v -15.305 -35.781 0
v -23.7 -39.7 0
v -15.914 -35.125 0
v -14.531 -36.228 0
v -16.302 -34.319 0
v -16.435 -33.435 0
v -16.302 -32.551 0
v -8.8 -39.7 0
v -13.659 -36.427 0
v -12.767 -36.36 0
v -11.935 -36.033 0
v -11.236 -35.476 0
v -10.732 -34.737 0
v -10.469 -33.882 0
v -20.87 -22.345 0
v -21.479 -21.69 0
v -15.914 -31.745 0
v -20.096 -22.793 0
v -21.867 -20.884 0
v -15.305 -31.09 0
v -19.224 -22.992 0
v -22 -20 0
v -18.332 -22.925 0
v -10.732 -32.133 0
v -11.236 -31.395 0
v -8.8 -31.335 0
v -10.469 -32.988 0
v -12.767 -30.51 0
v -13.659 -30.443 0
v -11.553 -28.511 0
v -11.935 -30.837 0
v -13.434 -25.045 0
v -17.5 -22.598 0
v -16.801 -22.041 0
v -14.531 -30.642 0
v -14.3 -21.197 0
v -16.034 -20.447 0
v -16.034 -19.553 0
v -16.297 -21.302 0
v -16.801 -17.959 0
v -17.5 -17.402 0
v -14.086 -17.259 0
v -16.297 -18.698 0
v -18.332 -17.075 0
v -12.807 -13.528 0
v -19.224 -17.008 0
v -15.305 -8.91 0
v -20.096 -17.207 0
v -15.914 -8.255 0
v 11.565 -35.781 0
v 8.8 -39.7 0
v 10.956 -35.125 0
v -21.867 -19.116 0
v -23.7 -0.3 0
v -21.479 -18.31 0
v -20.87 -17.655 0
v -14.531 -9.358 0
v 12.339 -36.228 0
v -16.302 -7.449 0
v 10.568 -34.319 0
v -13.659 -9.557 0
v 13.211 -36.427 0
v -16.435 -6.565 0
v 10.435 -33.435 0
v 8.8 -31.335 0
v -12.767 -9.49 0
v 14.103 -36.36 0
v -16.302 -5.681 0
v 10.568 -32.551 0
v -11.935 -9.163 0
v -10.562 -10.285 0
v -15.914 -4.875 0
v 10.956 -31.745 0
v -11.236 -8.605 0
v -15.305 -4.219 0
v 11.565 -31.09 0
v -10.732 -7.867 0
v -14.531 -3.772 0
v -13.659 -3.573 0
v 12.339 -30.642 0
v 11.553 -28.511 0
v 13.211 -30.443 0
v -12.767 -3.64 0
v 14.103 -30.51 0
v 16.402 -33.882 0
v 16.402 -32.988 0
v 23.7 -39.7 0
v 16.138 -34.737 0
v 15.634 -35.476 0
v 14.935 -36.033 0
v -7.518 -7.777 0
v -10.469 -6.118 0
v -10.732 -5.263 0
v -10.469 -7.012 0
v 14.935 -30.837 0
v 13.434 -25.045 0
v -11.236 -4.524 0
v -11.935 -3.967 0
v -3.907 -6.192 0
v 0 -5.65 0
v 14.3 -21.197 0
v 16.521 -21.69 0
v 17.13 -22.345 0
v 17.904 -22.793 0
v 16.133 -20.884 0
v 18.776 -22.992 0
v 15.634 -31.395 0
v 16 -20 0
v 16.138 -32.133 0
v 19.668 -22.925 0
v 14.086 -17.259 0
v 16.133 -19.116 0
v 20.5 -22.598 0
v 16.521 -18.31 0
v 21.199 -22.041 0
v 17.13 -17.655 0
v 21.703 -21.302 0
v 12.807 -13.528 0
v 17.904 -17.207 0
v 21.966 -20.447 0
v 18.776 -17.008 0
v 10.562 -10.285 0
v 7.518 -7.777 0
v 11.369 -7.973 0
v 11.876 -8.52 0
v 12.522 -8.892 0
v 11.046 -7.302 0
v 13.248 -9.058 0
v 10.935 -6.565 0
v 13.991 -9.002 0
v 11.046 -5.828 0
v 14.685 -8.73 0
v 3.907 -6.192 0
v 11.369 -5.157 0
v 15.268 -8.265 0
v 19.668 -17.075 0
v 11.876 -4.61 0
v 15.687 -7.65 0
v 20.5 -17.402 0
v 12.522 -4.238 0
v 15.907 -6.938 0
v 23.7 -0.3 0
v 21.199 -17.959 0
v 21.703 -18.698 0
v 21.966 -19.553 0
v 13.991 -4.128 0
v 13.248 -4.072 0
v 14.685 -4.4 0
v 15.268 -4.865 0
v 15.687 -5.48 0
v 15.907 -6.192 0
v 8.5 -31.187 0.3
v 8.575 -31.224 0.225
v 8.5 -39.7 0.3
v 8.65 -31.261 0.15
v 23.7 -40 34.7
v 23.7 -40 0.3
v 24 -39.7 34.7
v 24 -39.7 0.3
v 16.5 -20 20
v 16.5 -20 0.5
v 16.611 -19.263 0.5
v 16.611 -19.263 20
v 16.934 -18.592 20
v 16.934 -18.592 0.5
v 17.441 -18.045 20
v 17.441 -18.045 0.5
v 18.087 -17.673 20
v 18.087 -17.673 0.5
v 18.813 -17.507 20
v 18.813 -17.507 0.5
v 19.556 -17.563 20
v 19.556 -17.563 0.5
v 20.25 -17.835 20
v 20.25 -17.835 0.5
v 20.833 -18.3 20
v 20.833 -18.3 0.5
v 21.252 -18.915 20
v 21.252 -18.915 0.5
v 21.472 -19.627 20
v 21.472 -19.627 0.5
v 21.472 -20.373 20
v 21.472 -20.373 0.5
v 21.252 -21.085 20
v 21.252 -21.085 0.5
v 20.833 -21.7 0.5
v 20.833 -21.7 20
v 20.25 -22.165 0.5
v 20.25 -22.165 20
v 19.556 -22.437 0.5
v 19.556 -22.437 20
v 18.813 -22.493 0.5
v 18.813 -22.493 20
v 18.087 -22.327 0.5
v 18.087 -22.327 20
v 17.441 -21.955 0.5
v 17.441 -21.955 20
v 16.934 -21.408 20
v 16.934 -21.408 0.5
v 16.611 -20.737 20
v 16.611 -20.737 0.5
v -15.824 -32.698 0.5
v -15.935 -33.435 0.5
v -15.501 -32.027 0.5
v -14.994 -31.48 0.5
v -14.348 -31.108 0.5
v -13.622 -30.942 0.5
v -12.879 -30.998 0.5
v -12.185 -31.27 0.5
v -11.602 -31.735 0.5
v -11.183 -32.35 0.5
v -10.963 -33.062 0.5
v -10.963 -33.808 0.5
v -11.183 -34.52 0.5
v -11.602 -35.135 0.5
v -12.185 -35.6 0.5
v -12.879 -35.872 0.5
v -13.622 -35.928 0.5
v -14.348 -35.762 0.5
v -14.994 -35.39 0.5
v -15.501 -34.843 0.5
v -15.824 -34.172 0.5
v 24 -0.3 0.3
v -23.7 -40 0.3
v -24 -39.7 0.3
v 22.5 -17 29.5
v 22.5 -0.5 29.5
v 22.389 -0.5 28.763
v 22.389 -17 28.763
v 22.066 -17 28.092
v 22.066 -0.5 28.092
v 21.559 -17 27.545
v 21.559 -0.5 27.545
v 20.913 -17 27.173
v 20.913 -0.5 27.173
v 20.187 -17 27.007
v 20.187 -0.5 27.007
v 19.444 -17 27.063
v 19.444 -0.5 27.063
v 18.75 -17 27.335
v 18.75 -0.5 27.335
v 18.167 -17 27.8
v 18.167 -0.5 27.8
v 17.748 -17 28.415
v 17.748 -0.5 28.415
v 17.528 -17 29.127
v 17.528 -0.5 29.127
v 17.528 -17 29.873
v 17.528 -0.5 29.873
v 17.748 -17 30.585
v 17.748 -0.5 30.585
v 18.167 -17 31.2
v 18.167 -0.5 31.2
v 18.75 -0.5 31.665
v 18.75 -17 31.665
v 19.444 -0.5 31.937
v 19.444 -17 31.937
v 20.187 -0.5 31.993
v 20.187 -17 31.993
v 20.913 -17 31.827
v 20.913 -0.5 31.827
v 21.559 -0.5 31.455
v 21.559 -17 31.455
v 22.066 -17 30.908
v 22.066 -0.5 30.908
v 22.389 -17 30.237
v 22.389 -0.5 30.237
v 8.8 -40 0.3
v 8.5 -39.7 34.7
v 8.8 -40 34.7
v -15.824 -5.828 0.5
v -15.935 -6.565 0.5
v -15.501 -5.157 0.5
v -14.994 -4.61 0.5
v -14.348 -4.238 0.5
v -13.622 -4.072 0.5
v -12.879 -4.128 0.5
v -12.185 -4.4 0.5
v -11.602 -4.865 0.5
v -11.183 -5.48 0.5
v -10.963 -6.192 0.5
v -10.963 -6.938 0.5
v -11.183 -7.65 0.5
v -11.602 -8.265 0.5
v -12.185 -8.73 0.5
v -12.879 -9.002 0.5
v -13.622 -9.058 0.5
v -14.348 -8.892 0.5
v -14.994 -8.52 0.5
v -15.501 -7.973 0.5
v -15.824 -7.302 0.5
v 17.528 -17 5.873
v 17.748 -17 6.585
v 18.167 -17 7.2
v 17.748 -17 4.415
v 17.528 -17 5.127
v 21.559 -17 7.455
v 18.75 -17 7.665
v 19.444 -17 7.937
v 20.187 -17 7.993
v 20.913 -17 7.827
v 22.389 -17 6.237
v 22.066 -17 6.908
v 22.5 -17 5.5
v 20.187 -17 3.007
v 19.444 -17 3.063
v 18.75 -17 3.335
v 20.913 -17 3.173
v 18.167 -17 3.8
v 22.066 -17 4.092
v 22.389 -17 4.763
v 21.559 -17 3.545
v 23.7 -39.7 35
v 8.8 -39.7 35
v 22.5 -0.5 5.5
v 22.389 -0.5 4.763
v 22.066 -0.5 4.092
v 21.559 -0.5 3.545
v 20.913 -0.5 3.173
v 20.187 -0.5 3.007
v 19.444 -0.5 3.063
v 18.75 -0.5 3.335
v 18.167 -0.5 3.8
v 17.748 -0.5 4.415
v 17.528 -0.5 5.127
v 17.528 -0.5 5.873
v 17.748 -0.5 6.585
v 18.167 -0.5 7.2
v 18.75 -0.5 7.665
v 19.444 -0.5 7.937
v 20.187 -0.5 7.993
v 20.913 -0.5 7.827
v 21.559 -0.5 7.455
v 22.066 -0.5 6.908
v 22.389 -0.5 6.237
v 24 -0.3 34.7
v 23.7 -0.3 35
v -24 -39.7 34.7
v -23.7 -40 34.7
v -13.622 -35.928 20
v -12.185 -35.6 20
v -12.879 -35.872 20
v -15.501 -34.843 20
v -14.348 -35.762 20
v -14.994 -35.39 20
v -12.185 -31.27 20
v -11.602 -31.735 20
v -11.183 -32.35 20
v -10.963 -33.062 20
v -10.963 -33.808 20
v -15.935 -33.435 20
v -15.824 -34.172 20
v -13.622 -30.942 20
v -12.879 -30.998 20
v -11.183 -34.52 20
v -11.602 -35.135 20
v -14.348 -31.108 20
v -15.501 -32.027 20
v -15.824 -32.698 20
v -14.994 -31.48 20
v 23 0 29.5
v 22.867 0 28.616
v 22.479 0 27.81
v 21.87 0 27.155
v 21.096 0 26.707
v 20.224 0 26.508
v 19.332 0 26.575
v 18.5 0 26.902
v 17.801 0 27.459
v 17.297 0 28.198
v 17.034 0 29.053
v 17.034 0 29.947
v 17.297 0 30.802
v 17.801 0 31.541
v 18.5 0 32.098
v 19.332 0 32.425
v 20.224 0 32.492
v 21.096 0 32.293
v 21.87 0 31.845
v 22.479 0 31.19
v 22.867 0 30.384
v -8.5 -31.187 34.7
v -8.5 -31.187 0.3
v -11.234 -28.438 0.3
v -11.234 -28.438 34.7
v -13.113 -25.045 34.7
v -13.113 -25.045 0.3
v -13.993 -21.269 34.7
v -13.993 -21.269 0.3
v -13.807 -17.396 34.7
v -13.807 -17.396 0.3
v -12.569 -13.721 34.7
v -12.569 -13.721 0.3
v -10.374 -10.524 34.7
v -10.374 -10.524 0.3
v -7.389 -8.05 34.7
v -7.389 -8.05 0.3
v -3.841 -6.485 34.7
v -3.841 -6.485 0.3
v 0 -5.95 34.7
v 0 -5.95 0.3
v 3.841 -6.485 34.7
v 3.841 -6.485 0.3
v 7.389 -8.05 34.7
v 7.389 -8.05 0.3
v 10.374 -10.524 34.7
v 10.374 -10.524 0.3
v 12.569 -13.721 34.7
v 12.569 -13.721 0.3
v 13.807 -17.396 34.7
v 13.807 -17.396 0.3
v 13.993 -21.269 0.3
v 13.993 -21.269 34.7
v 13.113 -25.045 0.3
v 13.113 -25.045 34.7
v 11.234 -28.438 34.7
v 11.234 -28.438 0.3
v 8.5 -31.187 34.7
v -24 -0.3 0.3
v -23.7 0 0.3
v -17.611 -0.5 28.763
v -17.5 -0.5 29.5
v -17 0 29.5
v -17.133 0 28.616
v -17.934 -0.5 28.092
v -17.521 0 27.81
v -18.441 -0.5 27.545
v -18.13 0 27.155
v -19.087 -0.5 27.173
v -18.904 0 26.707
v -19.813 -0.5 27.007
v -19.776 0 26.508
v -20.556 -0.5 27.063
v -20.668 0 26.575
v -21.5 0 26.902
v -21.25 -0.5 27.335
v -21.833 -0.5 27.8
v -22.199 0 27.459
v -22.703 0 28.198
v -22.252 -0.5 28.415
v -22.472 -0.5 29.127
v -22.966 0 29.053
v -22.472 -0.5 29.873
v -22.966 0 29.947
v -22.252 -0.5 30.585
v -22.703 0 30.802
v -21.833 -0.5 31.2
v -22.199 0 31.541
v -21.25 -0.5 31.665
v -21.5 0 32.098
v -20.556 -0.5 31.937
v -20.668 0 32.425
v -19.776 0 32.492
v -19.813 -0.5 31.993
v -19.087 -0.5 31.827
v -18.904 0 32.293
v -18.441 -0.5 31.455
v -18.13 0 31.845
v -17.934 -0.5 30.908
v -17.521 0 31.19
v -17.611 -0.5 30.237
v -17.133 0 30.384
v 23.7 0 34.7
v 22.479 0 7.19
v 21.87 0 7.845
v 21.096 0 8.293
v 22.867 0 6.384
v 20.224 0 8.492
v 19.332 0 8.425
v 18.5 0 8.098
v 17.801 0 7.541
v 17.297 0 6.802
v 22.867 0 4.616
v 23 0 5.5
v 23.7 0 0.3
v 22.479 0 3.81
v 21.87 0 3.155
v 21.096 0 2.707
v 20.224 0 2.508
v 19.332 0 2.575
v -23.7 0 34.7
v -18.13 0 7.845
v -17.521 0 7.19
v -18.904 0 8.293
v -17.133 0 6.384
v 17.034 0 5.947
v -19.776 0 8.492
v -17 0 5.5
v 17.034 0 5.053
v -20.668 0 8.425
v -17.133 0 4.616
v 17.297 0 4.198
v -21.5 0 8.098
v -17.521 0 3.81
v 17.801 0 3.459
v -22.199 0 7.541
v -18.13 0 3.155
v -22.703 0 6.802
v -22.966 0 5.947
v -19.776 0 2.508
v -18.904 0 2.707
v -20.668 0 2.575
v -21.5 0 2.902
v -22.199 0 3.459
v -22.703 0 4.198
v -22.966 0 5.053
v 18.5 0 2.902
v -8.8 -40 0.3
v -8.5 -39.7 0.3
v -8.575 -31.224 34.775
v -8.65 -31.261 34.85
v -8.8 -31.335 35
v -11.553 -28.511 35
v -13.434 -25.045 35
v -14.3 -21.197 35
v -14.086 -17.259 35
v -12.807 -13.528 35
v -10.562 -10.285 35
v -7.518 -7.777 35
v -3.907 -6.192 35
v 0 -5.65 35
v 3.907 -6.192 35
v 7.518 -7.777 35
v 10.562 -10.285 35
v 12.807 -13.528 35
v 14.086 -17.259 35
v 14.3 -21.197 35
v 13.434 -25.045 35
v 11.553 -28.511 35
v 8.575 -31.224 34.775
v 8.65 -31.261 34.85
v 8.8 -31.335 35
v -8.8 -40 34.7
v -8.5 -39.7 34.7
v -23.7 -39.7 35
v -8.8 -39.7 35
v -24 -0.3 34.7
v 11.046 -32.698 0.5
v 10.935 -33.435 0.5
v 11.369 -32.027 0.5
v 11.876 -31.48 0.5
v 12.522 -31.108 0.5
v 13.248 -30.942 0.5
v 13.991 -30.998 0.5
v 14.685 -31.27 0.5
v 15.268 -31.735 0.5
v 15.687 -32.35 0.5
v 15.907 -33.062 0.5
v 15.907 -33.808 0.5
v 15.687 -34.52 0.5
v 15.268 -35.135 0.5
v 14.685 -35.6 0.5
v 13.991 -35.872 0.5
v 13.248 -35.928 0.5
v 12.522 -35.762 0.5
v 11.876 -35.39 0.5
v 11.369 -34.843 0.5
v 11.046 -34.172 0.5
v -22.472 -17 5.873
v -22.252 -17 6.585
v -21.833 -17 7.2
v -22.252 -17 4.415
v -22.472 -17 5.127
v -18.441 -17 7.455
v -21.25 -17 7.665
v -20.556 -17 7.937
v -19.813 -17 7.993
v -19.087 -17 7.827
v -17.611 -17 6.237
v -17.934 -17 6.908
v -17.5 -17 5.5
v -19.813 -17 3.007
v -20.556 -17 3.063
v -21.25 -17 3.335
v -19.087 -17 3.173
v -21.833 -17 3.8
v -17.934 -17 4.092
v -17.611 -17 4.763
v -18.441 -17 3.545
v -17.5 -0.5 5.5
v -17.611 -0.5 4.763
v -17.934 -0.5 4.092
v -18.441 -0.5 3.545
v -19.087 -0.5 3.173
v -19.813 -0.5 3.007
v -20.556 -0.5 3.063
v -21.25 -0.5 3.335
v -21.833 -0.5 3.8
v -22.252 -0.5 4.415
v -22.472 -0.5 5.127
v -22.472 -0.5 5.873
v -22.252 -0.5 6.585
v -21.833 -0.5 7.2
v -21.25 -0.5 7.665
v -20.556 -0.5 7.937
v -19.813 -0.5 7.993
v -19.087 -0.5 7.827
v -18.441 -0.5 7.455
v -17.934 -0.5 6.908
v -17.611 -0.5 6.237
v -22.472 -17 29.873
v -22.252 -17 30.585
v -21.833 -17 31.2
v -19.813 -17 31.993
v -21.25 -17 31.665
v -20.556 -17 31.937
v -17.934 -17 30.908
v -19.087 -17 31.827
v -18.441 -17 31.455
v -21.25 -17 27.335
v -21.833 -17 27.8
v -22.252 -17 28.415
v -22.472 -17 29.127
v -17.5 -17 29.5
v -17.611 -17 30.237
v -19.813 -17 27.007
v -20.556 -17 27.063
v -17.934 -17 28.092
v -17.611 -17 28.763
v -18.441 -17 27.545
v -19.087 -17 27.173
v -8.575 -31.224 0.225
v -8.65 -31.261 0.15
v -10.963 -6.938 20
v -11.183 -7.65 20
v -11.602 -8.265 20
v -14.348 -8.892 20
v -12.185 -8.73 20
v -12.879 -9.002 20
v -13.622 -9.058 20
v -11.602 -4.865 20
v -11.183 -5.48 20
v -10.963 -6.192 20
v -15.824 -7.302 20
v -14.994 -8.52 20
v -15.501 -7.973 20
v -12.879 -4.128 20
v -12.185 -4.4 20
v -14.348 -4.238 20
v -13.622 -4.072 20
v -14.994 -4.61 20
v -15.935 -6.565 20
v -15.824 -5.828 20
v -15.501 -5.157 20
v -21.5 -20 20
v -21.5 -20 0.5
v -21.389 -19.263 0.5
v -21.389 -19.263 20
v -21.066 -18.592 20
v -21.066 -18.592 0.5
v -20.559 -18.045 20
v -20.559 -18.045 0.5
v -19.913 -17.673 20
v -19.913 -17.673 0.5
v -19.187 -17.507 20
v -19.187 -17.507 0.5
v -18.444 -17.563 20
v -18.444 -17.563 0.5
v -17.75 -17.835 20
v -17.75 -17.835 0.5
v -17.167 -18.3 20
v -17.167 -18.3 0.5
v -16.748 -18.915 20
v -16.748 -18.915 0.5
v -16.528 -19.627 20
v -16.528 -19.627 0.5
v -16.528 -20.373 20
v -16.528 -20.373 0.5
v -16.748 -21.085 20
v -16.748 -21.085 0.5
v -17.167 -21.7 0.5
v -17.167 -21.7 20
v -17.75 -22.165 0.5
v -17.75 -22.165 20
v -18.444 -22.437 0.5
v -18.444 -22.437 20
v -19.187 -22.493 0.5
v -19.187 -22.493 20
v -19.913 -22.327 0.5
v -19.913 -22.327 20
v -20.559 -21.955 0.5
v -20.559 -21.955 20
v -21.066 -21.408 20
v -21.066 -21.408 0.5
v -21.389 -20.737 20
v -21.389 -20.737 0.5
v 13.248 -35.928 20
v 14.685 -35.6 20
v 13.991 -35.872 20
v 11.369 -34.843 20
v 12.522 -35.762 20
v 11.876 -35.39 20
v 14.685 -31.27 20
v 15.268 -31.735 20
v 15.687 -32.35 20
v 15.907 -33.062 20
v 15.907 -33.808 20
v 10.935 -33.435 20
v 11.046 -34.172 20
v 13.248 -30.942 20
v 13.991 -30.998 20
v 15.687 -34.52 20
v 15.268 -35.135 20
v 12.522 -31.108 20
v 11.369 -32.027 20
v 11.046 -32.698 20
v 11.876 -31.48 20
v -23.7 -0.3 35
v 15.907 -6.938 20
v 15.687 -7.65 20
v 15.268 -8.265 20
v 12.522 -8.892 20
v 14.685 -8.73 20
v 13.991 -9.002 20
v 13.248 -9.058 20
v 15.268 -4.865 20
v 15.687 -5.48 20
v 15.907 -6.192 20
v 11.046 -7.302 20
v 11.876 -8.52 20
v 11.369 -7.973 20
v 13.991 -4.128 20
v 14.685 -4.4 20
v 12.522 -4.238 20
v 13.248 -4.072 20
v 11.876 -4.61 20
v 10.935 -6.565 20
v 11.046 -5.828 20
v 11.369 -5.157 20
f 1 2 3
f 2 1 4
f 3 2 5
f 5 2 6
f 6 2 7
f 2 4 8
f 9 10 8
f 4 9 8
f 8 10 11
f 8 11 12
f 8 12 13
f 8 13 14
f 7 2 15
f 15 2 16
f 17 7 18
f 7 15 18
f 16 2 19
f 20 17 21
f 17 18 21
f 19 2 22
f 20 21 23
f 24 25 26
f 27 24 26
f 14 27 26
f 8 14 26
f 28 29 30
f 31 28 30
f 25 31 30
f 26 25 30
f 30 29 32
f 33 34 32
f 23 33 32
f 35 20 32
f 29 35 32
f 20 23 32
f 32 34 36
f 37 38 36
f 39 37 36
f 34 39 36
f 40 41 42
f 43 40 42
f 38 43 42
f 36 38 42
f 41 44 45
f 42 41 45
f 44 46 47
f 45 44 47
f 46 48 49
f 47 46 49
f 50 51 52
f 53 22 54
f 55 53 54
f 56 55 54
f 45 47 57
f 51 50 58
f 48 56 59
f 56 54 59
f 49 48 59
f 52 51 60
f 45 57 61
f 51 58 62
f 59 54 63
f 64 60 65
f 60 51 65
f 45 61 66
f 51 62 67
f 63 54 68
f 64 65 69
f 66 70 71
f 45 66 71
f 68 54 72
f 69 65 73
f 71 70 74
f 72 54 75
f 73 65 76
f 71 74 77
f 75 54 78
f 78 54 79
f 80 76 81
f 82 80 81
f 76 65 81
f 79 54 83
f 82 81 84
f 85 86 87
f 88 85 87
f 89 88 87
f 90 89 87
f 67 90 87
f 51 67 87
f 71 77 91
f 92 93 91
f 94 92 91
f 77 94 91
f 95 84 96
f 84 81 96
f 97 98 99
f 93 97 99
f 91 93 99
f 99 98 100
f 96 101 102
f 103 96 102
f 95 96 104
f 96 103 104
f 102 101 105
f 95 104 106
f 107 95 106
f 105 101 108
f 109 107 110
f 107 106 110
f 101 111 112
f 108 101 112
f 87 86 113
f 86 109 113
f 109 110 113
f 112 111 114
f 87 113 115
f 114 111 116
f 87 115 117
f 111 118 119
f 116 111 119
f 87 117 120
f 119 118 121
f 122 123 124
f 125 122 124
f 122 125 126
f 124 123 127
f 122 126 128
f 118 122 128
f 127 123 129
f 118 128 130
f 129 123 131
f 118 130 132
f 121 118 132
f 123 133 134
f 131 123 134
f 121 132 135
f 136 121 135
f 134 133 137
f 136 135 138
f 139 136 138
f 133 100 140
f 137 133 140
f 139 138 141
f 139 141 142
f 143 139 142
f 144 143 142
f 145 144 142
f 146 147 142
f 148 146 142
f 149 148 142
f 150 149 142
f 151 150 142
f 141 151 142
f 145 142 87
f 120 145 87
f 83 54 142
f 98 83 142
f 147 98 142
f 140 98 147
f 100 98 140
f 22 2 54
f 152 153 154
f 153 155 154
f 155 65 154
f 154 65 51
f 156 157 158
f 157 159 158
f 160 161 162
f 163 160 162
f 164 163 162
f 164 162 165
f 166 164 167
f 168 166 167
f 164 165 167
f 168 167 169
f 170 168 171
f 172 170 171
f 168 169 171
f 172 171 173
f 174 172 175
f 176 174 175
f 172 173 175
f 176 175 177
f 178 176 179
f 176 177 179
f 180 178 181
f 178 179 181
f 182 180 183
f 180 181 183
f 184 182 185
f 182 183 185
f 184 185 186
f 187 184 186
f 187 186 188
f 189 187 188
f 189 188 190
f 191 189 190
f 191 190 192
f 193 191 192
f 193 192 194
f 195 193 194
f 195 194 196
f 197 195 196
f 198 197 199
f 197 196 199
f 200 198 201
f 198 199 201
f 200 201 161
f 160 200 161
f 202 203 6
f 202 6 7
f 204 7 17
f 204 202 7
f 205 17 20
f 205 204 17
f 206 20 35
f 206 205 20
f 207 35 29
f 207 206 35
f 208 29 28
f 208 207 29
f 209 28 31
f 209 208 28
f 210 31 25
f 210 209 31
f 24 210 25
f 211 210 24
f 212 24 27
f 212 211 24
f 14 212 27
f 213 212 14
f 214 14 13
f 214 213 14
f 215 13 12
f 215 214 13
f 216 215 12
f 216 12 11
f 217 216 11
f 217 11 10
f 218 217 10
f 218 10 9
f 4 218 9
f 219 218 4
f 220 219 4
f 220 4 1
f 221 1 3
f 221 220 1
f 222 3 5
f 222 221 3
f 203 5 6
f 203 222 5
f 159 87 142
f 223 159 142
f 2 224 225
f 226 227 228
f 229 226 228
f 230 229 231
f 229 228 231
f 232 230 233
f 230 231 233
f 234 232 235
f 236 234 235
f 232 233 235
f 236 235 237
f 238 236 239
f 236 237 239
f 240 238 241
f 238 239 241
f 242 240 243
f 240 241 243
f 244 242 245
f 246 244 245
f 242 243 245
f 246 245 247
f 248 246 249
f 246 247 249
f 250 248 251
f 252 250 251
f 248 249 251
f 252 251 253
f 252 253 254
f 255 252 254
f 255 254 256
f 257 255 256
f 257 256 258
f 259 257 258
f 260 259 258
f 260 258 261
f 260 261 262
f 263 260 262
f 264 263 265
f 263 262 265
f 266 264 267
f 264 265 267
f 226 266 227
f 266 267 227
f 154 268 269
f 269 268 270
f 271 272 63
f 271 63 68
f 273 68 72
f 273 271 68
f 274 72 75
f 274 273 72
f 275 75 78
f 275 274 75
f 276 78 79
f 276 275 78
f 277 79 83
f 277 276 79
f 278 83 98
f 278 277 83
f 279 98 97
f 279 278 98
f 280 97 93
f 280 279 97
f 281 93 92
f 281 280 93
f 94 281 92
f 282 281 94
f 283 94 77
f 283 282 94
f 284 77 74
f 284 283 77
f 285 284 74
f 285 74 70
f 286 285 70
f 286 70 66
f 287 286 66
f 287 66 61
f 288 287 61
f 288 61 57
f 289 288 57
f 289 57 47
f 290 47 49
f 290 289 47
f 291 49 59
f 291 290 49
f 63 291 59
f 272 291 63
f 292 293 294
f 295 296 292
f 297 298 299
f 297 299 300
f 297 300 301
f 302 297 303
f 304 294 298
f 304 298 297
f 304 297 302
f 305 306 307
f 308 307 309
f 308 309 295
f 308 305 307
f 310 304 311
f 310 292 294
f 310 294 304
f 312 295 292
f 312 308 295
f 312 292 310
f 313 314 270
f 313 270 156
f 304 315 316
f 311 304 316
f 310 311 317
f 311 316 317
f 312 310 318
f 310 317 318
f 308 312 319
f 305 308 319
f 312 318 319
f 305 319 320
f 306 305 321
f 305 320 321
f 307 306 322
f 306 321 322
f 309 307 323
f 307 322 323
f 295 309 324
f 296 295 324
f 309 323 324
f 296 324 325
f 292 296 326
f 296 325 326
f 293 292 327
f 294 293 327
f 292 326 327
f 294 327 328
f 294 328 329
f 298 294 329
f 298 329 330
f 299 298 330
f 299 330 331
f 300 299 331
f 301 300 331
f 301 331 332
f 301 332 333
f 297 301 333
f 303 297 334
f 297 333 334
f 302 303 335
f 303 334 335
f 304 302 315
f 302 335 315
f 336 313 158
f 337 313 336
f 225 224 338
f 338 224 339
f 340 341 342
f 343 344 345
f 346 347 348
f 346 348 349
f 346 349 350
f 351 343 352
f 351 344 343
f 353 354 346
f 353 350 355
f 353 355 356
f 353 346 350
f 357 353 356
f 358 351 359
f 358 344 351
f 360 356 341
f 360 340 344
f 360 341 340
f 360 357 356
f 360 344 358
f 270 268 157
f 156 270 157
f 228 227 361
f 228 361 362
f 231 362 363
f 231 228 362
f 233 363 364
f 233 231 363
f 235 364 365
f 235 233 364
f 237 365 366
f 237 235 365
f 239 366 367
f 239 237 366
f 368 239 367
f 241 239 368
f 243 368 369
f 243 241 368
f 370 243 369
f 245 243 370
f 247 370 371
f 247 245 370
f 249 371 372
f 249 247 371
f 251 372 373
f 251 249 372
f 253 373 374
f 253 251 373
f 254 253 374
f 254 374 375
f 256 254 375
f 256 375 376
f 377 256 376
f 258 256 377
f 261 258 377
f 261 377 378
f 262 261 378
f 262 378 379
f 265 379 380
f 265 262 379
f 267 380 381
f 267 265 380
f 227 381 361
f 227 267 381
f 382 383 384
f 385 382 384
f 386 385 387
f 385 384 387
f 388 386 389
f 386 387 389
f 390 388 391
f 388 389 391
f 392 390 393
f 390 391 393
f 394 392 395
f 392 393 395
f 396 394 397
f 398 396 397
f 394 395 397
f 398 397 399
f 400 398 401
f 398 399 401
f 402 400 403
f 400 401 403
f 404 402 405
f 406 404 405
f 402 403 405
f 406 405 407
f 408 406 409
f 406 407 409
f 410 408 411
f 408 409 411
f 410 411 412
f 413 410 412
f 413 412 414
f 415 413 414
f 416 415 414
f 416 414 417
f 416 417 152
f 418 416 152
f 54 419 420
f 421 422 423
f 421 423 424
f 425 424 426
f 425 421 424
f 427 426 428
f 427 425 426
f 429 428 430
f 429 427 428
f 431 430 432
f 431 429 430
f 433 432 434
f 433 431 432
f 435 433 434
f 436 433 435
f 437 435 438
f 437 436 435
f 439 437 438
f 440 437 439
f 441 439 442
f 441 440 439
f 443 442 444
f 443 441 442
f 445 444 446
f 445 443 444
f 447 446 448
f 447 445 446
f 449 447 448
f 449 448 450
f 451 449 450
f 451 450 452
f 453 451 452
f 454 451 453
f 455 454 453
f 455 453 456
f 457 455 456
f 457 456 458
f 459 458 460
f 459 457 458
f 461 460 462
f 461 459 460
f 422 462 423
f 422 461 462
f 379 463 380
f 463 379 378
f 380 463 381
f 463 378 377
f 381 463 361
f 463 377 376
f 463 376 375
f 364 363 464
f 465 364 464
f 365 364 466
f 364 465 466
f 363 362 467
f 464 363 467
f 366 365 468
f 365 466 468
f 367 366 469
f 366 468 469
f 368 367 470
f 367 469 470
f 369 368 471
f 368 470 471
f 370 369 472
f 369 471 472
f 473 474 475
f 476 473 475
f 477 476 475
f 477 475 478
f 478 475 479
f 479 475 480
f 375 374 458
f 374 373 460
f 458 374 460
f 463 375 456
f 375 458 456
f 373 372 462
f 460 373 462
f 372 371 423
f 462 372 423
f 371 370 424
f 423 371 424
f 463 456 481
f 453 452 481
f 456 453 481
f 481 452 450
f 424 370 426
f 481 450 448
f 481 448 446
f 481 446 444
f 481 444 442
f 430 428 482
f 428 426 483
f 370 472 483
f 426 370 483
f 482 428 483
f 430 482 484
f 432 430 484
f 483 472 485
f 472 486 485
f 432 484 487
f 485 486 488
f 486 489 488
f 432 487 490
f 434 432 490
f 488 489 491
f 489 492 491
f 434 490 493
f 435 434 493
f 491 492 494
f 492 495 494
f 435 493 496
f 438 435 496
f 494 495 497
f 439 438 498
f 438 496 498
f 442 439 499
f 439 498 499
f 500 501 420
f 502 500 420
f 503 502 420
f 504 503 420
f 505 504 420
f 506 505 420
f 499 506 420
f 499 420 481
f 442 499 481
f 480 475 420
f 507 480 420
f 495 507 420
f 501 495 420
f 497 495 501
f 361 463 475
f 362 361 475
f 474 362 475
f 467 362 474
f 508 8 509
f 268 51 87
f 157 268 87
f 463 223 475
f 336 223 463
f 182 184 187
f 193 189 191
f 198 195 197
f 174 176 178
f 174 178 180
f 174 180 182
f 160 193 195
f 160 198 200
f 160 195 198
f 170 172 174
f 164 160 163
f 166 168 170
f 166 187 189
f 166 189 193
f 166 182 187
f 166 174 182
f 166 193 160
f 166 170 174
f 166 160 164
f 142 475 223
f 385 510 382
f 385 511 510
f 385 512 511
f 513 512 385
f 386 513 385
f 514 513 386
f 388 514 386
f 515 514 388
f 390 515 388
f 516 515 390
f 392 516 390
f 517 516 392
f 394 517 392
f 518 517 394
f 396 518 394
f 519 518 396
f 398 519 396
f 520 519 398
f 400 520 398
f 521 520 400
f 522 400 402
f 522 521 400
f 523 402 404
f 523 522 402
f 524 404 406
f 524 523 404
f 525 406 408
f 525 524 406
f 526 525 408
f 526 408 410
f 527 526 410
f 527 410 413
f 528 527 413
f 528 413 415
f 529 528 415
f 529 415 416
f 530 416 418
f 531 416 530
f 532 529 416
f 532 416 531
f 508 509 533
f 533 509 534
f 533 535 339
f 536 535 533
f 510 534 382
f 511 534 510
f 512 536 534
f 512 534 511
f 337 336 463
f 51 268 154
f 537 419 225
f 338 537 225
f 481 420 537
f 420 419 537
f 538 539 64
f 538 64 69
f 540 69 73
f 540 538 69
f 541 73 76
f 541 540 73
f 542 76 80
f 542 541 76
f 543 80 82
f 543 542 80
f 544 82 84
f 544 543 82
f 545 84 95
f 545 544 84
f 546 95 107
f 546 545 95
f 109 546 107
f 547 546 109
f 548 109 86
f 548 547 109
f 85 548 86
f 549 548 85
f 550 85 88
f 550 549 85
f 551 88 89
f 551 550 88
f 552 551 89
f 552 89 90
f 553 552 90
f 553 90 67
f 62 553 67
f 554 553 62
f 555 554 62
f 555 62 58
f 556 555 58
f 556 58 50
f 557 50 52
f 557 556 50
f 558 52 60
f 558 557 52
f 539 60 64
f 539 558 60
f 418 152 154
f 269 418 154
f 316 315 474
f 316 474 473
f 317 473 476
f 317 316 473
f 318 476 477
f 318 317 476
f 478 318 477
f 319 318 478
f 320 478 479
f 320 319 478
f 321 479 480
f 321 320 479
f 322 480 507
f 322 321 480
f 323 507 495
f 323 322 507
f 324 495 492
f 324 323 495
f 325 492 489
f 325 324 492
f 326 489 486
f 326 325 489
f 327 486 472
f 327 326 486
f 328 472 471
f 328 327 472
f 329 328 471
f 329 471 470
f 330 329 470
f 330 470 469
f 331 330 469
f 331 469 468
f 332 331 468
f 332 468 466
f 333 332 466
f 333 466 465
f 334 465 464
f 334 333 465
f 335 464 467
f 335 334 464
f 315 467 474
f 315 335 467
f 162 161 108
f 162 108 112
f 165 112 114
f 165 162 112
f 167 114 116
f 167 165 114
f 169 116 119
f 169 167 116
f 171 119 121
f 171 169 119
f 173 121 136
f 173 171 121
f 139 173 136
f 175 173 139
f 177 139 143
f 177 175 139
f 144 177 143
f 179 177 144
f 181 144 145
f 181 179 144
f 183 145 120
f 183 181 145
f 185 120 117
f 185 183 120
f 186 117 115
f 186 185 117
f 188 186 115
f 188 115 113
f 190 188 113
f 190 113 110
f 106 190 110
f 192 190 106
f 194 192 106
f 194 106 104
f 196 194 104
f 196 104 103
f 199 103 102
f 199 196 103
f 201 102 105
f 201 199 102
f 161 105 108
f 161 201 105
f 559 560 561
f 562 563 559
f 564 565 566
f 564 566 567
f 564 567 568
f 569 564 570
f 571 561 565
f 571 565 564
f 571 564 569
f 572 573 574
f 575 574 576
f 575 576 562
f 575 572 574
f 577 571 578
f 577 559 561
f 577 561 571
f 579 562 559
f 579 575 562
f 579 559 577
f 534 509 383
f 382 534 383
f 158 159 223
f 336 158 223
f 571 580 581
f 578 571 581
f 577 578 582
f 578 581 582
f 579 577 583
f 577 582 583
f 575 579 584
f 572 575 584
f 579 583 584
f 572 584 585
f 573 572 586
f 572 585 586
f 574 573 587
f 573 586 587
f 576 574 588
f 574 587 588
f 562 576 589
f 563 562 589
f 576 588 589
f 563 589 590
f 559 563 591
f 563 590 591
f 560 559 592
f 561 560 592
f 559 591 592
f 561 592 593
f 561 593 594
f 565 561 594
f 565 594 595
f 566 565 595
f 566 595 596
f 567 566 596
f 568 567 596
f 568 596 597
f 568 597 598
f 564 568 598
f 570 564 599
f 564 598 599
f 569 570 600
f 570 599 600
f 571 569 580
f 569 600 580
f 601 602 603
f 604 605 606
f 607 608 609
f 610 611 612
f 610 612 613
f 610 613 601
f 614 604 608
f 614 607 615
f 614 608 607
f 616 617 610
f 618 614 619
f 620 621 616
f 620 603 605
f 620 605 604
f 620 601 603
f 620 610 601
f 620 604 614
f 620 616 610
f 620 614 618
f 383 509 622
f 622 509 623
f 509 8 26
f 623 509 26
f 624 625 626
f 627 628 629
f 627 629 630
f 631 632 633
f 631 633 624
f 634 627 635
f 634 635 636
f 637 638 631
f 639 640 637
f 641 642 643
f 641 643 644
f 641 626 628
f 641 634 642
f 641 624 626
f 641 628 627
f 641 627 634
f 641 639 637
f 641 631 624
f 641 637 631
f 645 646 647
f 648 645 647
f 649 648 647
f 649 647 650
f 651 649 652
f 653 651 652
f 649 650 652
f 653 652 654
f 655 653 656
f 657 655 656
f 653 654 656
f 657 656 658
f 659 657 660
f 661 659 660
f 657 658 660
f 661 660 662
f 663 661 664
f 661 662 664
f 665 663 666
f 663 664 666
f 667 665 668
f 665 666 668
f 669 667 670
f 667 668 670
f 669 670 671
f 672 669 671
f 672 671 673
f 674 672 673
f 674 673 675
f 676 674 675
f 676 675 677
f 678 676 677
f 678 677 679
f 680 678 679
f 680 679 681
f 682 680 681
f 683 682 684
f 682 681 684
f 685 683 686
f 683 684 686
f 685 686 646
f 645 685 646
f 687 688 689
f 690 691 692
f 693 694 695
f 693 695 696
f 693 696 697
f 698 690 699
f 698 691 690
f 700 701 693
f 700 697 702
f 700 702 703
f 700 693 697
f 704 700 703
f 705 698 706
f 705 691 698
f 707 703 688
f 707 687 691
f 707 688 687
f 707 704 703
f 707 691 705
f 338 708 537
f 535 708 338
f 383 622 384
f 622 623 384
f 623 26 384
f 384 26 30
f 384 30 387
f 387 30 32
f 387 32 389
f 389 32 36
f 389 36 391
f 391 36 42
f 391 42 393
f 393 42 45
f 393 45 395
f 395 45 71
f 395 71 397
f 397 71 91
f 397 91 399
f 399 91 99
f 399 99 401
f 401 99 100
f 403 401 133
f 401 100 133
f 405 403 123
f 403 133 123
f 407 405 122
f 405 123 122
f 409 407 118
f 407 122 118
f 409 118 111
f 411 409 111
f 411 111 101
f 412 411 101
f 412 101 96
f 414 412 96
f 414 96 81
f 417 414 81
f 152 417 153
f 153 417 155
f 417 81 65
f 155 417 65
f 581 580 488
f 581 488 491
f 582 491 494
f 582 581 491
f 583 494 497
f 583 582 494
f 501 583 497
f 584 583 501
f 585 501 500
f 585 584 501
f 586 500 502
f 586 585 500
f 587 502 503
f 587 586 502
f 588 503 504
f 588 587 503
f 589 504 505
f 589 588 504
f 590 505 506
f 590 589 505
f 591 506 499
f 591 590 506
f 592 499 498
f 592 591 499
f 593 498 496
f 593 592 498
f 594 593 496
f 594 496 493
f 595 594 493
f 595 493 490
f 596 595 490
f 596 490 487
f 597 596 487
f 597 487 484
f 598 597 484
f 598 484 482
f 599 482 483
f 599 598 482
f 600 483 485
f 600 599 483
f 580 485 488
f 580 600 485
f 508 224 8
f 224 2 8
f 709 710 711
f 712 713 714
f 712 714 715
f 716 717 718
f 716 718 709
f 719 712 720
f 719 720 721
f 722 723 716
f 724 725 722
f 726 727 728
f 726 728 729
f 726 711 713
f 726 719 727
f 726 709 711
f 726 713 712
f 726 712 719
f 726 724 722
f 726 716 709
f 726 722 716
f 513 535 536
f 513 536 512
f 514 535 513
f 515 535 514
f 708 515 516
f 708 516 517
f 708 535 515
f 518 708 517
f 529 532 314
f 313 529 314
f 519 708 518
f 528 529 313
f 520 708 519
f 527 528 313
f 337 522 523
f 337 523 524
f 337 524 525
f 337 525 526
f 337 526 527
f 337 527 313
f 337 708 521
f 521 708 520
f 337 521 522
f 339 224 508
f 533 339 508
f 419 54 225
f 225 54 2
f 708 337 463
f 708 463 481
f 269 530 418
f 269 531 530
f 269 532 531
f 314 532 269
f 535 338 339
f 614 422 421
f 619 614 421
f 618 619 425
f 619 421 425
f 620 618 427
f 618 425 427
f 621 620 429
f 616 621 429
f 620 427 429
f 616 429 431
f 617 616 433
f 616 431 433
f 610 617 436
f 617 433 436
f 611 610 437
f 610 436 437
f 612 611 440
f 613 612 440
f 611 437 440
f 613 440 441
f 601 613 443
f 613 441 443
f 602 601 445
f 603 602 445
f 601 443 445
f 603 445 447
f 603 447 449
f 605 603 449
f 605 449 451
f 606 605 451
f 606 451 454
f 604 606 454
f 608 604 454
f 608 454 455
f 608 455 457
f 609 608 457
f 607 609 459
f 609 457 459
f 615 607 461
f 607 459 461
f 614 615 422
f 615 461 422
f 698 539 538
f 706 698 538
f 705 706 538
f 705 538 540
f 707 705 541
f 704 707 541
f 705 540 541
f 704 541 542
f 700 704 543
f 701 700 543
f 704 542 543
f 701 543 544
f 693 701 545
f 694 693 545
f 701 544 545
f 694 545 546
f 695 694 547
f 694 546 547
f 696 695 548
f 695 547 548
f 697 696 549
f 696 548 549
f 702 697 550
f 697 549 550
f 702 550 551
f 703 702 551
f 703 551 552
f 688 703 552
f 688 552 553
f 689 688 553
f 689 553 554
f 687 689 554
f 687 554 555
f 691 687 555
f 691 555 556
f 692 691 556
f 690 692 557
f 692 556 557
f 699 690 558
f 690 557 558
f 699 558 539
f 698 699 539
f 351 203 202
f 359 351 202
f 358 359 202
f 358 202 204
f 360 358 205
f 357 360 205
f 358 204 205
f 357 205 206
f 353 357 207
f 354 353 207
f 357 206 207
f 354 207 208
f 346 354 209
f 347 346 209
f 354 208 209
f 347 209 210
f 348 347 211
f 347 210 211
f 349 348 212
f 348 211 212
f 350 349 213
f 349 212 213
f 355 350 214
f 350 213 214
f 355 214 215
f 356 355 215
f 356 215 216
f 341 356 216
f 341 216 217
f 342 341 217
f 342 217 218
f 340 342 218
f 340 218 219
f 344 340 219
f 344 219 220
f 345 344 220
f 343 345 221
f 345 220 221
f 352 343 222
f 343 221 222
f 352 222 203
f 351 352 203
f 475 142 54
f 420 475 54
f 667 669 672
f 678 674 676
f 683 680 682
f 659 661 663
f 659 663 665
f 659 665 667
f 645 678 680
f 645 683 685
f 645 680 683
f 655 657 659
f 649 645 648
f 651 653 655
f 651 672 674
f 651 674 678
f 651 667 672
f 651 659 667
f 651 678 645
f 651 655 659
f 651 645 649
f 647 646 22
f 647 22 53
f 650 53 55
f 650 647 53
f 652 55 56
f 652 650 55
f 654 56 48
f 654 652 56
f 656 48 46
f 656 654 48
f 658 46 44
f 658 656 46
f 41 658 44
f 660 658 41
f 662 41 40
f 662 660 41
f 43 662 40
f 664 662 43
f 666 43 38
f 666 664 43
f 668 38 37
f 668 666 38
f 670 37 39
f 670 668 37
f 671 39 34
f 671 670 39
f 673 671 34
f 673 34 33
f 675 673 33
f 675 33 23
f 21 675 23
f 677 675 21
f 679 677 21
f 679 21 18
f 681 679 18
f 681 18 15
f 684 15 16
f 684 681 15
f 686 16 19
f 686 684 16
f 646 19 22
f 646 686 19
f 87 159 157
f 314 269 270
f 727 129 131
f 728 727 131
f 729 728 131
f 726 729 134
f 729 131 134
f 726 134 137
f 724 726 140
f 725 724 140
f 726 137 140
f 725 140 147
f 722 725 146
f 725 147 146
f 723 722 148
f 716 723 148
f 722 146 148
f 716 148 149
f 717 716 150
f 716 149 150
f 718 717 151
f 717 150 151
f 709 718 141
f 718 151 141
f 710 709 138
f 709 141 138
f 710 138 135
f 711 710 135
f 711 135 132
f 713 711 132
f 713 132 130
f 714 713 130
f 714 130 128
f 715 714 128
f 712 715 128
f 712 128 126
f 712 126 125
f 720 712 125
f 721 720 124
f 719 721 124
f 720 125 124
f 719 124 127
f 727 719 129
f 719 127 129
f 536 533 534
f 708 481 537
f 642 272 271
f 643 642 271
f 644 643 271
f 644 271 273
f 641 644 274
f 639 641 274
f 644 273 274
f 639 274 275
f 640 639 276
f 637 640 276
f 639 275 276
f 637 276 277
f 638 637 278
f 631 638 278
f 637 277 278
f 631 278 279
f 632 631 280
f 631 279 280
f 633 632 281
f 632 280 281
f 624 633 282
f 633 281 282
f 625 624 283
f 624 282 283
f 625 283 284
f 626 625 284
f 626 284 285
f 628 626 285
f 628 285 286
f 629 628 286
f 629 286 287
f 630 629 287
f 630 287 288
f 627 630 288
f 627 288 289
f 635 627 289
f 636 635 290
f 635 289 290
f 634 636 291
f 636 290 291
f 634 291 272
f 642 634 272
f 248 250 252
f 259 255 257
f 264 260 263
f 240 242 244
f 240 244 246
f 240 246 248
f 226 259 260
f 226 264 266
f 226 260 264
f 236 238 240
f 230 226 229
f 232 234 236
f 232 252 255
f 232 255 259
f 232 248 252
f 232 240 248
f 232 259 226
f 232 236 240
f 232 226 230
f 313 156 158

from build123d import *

# Parameters (mm, degrees)
BOSS_EXTRUDE1_DEPTH = 35
CHAMFER2_SIZE       = 0.3
SKETCH2_R           = 2.5
CUT_EXTRUDE1_DEPTH  = 17
SKETCH3_R           = 2.5
CUT_EXTRUDE2_DEPTH  = 20
CHAMFER3_SIZE       = 0.5


with BuildPart() as part:
    # Sketch1 → Boss-Extrude1 (new body)
    with BuildSketch(Plane.XY):
        with BuildLine():
            Line((24, 0), (-24, 0))
            Line((-24, 0), (-24, -40))
            Line((-24, -40), (-8.5, -40))
            Line((-8.5, -40), (-8.5, -31.187157816))
            ThreePointArc((-8.5, -31.187157816), (0, -5.95), (8.5, -31.187157816))
            Line((8.5, -31.187157816), (8.5, -40))
            Line((8.5, -40), (24, -40))
            Line((24, -40), (24, 0))
        make_face()
    extrude(amount=BOSS_EXTRUDE1_DEPTH)

    # Chamfer2
    chamfer2_edges = [part.edges().sort_by_distance(p)[0] for p in [
        (0, -5.95, 35),
        (-8.5, -35.593578908, 0),
        (-16.25, -40, 0),
        (8.5, -35.593578908, 35),
        (-24, -40, 17.5),
        (-24, 0, 17.5),
        (24, 0, 17.5),
        (24, -40, 17.5),
        (8.5, -40, 17.5),
        (-8.5, -40, 17.5),
        (16.25, -40, 35),
        (24, -20, 35),
        (0, 0, 35),
        (-24, -20, 35),
        (-16.25, -40, 35),
        (-8.5, -35.593578908, 35),
        (-24, -20, 0),
        (0, 0, 0),
        (24, -20, 0),
        (16.25, -40, 0),
        (8.5, -35.593578908, 0),
        (0, -5.95, 0),
    ]]
    chamfer(chamfer2_edges, length=CHAMFER2_SIZE)

    # Sketch2 → Cut-Extrude1 (cut)
    with BuildSketch(Plane(origin=(0, 0, 0), x_dir=(1, 0, 0), z_dir=(0, 1, 0))):
        with Locations((-20, -5.5)):
            Circle(SKETCH2_R)
        with Locations((20, -5.5)):
            Circle(SKETCH2_R)
        with Locations((20, -29.5)):
            Circle(SKETCH2_R)
        with Locations((-20, -29.5)):
            Circle(SKETCH2_R)
    extrude(amount=-CUT_EXTRUDE1_DEPTH, mode=Mode.SUBTRACT)

    # Sketch3 → Cut-Extrude2 (cut)
    with BuildSketch(Plane(origin=(0, 0, 0), x_dir=(-1, 0, 0), z_dir=(0, 0, -1))):
        with Locations((-13.435028843, -33.435028843)):
            Circle(SKETCH3_R)
        with Locations((13.435028843, -33.435028843)):
            Circle(SKETCH3_R)
        with Locations((13.435028843, -6.564971157)):
            Circle(SKETCH3_R)
        with Locations((-13.435028843, -6.564971157)):
            Circle(SKETCH3_R)
        with Locations((-19, -20)):
            Circle(SKETCH3_R)
        with Locations((19, -20)):
            Circle(SKETCH3_R)
    extrude(amount=-CUT_EXTRUDE2_DEPTH, mode=Mode.SUBTRACT)

    # Chamfer3
    chamfer3_edges = [part.edges().sort_by_distance(p)[0] for p in [
        (17.5, 0, 29.5),
        (-22.5, 0, 29.5),
        (15.935028843, -33.435028843, 0),
        (-10.935028843, -33.435028843, 0),
        (-10.935028843, -6.564971157, 0),
        (-16.5, -20, 0),
        (21.5, -20, 0),
        (-22.5, 0, 5.5),
        (17.5, 0, 5.5),
    ]]
    chamfer(chamfer3_edges, length=CHAMFER3_SIZE)


solid = part.part
